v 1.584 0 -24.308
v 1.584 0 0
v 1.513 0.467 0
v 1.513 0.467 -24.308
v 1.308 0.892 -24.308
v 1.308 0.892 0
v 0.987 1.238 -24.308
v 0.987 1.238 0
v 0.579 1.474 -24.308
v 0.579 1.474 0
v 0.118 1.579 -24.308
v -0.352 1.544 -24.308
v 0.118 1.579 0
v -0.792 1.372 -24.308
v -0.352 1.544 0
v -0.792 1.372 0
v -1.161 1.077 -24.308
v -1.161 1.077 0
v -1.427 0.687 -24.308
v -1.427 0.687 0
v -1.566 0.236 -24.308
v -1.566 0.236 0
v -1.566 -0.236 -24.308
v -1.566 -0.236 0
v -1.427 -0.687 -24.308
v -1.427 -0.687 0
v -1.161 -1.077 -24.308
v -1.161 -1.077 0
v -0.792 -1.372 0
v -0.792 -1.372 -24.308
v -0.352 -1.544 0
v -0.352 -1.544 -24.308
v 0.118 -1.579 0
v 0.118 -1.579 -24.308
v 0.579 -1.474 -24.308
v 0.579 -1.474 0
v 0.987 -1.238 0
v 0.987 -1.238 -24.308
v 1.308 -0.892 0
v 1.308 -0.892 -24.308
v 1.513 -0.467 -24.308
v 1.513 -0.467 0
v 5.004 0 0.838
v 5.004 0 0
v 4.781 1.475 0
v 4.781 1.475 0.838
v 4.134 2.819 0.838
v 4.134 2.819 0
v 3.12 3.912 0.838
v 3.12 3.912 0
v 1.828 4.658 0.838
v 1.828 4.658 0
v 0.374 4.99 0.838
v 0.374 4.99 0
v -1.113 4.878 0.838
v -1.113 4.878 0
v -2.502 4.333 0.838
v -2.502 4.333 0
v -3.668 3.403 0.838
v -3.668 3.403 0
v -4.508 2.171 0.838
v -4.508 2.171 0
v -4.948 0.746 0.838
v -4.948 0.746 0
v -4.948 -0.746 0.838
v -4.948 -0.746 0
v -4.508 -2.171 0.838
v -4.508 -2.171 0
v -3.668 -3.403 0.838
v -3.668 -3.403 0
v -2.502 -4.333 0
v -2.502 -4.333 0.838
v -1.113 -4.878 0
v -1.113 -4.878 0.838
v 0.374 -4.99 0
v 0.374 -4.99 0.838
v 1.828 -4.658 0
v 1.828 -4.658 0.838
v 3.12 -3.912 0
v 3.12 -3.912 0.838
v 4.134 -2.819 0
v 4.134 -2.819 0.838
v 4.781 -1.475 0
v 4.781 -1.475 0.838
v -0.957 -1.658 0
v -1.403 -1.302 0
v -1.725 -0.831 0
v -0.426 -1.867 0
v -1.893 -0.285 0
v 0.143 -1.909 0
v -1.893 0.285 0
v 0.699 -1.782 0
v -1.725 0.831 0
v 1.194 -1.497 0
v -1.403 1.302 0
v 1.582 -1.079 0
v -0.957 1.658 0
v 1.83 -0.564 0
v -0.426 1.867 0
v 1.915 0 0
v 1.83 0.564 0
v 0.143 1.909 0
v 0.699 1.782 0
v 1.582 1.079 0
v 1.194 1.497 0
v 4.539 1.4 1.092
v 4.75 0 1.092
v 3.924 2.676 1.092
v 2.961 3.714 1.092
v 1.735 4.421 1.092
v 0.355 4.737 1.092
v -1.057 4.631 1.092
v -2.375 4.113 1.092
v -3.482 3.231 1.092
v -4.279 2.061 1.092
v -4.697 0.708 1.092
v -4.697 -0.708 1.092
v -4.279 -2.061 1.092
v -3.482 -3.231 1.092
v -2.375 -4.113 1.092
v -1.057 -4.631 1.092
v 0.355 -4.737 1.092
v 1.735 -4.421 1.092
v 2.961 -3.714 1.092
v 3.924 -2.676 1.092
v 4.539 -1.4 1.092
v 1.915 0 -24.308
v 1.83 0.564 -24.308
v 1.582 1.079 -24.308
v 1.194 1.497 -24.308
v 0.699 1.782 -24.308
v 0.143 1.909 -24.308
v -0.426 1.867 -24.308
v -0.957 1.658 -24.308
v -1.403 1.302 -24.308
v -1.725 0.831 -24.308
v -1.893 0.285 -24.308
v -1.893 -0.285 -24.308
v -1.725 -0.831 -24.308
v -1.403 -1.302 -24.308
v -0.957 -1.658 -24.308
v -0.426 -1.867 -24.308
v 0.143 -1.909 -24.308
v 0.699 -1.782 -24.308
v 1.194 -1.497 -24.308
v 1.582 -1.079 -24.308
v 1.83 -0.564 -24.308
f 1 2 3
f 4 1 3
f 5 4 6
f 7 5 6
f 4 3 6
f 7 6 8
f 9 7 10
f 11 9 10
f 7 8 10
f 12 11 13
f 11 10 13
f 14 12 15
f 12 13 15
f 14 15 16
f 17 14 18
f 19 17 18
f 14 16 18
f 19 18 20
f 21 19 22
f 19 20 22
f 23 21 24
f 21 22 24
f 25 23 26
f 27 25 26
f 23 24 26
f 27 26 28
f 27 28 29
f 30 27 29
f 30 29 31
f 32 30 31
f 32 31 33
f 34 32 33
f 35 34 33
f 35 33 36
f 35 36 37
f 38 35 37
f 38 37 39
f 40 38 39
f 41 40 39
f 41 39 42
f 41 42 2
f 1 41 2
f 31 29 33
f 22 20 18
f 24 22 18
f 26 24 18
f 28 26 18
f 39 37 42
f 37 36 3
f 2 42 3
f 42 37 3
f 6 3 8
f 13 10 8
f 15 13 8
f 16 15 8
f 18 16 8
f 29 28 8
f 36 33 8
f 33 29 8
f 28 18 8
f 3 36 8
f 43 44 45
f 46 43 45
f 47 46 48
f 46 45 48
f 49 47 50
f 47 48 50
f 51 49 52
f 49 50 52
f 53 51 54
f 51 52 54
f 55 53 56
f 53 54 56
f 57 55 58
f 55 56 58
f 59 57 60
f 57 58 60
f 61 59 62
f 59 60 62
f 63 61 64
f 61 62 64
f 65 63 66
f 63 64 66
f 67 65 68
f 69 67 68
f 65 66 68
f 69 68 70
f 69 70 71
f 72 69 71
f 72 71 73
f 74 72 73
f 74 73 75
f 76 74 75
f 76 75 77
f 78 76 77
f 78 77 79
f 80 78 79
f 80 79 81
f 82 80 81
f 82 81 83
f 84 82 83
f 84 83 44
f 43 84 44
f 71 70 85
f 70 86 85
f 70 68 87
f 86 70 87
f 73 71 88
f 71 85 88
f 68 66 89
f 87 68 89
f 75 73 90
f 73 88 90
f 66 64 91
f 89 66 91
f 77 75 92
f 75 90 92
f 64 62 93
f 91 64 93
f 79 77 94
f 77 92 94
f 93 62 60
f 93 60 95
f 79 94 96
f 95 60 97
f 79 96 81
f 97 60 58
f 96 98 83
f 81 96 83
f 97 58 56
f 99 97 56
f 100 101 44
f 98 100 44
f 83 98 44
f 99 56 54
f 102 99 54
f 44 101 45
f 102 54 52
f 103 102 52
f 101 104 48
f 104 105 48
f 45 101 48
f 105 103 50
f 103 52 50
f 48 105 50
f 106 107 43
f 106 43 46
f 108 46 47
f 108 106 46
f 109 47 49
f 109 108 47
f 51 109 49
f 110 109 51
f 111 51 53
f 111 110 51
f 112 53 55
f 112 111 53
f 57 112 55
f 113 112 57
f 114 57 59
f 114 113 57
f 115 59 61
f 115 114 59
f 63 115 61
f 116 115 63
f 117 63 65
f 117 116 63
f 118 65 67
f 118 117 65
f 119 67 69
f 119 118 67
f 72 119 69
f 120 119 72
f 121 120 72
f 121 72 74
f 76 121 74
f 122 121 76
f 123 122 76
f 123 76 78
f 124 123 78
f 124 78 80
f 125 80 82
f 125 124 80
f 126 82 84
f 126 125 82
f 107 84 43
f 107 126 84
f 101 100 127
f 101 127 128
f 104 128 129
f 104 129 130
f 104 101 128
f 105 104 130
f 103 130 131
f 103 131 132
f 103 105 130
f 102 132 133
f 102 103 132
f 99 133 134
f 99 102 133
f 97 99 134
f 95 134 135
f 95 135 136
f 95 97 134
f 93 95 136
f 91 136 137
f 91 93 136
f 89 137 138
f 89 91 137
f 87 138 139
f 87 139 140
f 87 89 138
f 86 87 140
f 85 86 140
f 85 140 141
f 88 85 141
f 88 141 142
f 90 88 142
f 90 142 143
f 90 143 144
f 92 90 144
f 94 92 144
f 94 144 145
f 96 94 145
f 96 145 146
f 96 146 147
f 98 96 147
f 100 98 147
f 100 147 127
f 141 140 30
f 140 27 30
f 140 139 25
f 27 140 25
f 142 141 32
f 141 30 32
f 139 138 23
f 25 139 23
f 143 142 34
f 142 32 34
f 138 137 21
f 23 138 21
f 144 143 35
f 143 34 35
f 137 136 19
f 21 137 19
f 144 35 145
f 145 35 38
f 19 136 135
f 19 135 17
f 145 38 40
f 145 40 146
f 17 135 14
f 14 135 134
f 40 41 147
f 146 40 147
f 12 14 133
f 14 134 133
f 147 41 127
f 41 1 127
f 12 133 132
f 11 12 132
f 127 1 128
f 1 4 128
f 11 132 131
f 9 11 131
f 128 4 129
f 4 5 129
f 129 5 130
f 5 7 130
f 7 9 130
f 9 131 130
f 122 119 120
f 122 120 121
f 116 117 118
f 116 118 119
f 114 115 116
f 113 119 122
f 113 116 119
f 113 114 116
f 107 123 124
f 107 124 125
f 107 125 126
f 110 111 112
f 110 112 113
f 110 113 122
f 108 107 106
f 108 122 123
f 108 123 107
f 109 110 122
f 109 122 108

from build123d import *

# Parameters (mm, degrees)
F0_R      = 5.0038
F0_R_2    = 1.9145814382
F1_DEPTH  = 1.6002
F1_FACE_R = 5.0038
F2_DEPTH  = 0.508
F3_SIZE   = 0.254
F4_R      = 1.9145814382
F4_R_2    = 1.5836825197
F5_DEPTH  = 25.4


with BuildPart() as f1:
    # F0 (on Top) → F1 (new body)
    with BuildSketch(Plane.XY):
        Circle(F0_R)
        Circle(F0_R_2, mode=Mode.SUBTRACT)
        Circle(F0_R_2)
    extrude(amount=F1_DEPTH)

    # F0 (on Top) + F1_face (on face) → F2 (cut)
    with BuildSketch(Plane.XY):
        Circle(F0_R)
        Circle(F0_R_2, mode=Mode.SUBTRACT)
    with BuildSketch(Plane.XY.offset(1.6002)):
        Circle(F1_FACE_R)
    extrude(amount=-F2_DEPTH, mode=Mode.SUBTRACT)

    # F3
    f3_edges = [f1.edges().sort_by_distance(p)[0] for p in [
        (-5.0038, 0, 1.0922),
    ]]
    chamfer(f3_edges, length=F3_SIZE)

    # F4 (on face) → F5 (join)
    with BuildSketch(Plane.XY.offset(1.0922)):
        Circle(F4_R)
        Circle(F4_R_2, mode=Mode.SUBTRACT)
    extrude(amount=-F5_DEPTH)


solid = f1.part
